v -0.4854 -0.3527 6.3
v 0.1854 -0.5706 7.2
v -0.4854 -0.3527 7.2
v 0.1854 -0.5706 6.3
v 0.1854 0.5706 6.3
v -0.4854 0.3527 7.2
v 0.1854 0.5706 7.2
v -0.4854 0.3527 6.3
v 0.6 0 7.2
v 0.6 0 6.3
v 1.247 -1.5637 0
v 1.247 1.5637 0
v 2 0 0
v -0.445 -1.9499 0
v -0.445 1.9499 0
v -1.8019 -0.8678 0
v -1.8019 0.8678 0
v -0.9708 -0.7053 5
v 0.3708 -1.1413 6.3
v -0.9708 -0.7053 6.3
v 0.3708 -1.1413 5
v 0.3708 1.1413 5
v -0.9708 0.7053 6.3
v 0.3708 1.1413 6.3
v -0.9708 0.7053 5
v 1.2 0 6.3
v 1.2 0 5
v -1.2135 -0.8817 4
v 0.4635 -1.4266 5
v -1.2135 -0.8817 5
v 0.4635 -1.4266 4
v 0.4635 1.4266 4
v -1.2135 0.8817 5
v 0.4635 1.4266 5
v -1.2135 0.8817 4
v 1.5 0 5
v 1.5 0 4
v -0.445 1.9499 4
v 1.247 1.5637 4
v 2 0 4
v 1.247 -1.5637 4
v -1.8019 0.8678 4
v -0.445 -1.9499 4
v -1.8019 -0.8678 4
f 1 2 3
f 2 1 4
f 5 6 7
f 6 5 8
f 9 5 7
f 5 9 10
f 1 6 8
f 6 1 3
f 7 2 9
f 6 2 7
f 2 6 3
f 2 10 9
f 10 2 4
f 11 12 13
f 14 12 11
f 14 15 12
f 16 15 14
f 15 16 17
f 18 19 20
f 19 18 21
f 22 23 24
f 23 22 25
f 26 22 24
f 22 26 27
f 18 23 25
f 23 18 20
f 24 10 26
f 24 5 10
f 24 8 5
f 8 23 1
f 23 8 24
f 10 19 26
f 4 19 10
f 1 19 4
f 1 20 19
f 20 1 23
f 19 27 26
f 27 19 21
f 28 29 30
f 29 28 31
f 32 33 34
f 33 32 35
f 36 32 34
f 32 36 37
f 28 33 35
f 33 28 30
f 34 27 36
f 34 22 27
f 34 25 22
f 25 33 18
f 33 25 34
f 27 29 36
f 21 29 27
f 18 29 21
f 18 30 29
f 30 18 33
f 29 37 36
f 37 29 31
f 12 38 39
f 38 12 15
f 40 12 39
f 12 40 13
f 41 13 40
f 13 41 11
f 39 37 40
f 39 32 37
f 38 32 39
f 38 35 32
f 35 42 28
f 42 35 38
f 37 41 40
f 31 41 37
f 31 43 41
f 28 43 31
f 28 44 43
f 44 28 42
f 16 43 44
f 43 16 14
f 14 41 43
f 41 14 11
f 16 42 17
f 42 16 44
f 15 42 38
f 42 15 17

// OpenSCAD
cylinder(h=7.2,r=0.6);
cylinder(h=6.3,r=1.2);
cylinder(h=5,r=1.5);
cylinder(h=4,r=2);
